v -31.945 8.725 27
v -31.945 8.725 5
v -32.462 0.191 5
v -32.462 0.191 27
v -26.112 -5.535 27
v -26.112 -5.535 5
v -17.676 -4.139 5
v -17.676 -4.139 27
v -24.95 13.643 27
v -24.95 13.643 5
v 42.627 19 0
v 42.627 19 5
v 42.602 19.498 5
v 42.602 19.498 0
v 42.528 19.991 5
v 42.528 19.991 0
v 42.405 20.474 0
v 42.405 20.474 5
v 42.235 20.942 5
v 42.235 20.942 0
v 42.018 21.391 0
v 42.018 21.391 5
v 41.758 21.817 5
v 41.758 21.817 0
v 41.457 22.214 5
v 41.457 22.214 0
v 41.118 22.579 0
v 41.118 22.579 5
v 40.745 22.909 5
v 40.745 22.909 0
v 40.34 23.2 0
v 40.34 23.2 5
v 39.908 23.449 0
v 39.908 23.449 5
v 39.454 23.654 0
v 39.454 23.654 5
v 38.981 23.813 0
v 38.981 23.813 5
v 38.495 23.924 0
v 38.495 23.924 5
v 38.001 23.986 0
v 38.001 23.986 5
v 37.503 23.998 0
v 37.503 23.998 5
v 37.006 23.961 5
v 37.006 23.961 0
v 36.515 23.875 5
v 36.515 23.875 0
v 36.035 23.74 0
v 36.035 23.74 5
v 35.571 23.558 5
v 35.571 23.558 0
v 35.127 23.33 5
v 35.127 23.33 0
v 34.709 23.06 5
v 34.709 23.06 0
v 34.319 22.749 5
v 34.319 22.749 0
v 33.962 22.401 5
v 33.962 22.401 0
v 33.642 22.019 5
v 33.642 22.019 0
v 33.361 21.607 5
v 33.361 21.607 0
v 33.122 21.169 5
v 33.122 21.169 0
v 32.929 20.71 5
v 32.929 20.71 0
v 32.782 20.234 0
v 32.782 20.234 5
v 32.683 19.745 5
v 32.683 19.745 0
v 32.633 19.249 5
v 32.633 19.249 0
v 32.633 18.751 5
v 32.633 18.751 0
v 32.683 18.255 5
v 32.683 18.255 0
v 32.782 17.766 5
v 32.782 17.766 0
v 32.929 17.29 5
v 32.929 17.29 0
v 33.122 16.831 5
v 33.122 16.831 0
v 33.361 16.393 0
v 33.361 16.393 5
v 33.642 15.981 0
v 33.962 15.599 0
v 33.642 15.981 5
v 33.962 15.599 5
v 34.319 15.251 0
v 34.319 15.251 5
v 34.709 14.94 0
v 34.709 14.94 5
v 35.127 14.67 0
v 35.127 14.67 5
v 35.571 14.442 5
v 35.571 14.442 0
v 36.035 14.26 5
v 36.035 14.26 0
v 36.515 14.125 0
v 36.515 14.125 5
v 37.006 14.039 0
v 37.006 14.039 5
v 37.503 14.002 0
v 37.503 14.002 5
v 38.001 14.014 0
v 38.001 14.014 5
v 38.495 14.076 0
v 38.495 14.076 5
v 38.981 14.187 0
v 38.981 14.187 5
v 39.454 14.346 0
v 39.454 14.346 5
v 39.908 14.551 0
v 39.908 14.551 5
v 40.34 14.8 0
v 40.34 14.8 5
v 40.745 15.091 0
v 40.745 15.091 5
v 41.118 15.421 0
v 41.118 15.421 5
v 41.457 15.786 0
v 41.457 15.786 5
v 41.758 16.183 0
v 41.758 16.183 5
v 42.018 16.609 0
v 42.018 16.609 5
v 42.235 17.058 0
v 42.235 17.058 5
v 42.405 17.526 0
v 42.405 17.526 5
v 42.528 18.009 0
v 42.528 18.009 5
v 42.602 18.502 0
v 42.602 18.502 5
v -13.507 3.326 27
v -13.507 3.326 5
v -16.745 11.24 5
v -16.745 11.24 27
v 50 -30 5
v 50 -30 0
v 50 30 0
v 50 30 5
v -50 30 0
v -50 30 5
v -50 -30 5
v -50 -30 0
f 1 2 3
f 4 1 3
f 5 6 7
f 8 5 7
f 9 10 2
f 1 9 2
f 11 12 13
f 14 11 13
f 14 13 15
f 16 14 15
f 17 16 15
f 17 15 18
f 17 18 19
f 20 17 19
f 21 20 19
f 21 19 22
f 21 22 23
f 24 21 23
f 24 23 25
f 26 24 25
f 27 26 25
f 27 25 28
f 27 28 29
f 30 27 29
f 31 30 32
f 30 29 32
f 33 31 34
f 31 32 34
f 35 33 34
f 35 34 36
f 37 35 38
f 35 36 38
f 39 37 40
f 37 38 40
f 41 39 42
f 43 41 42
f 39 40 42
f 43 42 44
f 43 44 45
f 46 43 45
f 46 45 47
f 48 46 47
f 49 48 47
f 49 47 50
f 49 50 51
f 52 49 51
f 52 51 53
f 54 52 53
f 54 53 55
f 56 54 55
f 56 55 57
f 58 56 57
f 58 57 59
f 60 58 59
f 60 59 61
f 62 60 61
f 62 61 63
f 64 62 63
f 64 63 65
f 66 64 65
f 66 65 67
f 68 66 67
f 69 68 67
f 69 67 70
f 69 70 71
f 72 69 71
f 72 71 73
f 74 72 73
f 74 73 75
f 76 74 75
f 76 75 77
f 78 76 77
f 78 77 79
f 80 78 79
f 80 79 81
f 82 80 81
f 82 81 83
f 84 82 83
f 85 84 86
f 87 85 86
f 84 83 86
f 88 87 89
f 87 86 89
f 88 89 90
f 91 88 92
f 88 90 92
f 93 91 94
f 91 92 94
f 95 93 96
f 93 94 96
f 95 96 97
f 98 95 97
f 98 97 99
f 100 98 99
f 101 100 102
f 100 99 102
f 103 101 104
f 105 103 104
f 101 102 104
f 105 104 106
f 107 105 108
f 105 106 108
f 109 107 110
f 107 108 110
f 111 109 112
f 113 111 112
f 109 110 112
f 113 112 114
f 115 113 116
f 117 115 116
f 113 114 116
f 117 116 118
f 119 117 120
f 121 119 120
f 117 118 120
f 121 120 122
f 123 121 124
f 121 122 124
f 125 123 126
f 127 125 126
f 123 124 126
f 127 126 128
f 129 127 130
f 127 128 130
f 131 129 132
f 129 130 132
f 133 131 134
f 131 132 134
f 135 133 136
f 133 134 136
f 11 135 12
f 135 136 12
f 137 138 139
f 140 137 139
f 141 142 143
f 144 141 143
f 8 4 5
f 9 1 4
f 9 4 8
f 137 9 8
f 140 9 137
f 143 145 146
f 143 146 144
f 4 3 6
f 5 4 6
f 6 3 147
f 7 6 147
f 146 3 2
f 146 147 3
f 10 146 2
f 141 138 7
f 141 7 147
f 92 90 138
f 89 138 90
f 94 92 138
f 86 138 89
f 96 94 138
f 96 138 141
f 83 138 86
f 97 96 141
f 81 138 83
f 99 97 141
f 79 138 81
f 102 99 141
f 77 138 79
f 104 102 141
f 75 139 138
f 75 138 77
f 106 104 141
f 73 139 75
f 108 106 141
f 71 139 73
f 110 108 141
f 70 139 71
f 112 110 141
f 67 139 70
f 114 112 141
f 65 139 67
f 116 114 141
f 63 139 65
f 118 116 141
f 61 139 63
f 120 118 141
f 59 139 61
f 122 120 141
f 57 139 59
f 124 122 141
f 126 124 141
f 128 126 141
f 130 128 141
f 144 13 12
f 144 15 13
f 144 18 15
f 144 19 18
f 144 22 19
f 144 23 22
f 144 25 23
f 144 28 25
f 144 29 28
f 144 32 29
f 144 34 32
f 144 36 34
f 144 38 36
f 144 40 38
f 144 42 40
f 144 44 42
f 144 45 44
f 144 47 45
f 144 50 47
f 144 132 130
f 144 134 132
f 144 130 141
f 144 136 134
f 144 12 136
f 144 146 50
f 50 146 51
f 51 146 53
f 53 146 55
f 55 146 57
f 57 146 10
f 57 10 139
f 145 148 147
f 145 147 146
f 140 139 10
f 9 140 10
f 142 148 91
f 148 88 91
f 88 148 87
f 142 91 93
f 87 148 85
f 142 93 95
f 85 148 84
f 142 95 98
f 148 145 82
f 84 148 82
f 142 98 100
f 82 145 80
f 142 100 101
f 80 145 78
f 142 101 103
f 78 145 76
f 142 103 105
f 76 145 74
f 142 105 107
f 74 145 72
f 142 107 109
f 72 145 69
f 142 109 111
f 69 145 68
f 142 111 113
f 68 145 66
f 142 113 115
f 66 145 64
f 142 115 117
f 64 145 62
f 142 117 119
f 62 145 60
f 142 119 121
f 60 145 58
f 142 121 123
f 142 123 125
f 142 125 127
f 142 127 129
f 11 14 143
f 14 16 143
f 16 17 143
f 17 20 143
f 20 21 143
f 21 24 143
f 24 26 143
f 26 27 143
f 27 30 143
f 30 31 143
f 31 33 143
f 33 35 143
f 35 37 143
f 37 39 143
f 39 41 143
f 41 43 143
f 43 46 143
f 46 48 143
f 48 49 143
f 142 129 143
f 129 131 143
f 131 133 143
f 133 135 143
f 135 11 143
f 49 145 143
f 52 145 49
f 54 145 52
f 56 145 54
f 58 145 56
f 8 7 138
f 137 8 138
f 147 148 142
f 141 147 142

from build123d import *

# Parameters (mm, degrees)
F0_W     = 100
F0_H     = 60
F1_DEPTH = 5
F2_R     = 5
F3_DEPTH = 25
F5_DEPTH = 22


with BuildPart() as f1:
    # F0 (on Top) → F1 (new body)
    with BuildSketch(Plane.XY):
        Rectangle(F0_W, F0_H)
    extrude(amount=F1_DEPTH)

    # F2 (on face) → F3 (cut)
    with BuildSketch(Plane.XY.offset(5)):
        with Locations((37.62725, 19.000012)):
            Circle(F2_R)
    extrude(amount=-F3_DEPTH, mode=Mode.SUBTRACT)

    # F4 (on face) → F5 (join)
    with BuildSketch(Plane.XY.offset(5)):
        Polygon((-13.507203, 3.325971), (-16.744654, 11.239743), (-24.950408, 13.642757), (-31.945364, 8.725496), (-32.462178, 0.190757), (-26.111678, -5.534628), (-17.675921, -4.139326), align=None)
    extrude(amount=F5_DEPTH)


solid = f1.part
